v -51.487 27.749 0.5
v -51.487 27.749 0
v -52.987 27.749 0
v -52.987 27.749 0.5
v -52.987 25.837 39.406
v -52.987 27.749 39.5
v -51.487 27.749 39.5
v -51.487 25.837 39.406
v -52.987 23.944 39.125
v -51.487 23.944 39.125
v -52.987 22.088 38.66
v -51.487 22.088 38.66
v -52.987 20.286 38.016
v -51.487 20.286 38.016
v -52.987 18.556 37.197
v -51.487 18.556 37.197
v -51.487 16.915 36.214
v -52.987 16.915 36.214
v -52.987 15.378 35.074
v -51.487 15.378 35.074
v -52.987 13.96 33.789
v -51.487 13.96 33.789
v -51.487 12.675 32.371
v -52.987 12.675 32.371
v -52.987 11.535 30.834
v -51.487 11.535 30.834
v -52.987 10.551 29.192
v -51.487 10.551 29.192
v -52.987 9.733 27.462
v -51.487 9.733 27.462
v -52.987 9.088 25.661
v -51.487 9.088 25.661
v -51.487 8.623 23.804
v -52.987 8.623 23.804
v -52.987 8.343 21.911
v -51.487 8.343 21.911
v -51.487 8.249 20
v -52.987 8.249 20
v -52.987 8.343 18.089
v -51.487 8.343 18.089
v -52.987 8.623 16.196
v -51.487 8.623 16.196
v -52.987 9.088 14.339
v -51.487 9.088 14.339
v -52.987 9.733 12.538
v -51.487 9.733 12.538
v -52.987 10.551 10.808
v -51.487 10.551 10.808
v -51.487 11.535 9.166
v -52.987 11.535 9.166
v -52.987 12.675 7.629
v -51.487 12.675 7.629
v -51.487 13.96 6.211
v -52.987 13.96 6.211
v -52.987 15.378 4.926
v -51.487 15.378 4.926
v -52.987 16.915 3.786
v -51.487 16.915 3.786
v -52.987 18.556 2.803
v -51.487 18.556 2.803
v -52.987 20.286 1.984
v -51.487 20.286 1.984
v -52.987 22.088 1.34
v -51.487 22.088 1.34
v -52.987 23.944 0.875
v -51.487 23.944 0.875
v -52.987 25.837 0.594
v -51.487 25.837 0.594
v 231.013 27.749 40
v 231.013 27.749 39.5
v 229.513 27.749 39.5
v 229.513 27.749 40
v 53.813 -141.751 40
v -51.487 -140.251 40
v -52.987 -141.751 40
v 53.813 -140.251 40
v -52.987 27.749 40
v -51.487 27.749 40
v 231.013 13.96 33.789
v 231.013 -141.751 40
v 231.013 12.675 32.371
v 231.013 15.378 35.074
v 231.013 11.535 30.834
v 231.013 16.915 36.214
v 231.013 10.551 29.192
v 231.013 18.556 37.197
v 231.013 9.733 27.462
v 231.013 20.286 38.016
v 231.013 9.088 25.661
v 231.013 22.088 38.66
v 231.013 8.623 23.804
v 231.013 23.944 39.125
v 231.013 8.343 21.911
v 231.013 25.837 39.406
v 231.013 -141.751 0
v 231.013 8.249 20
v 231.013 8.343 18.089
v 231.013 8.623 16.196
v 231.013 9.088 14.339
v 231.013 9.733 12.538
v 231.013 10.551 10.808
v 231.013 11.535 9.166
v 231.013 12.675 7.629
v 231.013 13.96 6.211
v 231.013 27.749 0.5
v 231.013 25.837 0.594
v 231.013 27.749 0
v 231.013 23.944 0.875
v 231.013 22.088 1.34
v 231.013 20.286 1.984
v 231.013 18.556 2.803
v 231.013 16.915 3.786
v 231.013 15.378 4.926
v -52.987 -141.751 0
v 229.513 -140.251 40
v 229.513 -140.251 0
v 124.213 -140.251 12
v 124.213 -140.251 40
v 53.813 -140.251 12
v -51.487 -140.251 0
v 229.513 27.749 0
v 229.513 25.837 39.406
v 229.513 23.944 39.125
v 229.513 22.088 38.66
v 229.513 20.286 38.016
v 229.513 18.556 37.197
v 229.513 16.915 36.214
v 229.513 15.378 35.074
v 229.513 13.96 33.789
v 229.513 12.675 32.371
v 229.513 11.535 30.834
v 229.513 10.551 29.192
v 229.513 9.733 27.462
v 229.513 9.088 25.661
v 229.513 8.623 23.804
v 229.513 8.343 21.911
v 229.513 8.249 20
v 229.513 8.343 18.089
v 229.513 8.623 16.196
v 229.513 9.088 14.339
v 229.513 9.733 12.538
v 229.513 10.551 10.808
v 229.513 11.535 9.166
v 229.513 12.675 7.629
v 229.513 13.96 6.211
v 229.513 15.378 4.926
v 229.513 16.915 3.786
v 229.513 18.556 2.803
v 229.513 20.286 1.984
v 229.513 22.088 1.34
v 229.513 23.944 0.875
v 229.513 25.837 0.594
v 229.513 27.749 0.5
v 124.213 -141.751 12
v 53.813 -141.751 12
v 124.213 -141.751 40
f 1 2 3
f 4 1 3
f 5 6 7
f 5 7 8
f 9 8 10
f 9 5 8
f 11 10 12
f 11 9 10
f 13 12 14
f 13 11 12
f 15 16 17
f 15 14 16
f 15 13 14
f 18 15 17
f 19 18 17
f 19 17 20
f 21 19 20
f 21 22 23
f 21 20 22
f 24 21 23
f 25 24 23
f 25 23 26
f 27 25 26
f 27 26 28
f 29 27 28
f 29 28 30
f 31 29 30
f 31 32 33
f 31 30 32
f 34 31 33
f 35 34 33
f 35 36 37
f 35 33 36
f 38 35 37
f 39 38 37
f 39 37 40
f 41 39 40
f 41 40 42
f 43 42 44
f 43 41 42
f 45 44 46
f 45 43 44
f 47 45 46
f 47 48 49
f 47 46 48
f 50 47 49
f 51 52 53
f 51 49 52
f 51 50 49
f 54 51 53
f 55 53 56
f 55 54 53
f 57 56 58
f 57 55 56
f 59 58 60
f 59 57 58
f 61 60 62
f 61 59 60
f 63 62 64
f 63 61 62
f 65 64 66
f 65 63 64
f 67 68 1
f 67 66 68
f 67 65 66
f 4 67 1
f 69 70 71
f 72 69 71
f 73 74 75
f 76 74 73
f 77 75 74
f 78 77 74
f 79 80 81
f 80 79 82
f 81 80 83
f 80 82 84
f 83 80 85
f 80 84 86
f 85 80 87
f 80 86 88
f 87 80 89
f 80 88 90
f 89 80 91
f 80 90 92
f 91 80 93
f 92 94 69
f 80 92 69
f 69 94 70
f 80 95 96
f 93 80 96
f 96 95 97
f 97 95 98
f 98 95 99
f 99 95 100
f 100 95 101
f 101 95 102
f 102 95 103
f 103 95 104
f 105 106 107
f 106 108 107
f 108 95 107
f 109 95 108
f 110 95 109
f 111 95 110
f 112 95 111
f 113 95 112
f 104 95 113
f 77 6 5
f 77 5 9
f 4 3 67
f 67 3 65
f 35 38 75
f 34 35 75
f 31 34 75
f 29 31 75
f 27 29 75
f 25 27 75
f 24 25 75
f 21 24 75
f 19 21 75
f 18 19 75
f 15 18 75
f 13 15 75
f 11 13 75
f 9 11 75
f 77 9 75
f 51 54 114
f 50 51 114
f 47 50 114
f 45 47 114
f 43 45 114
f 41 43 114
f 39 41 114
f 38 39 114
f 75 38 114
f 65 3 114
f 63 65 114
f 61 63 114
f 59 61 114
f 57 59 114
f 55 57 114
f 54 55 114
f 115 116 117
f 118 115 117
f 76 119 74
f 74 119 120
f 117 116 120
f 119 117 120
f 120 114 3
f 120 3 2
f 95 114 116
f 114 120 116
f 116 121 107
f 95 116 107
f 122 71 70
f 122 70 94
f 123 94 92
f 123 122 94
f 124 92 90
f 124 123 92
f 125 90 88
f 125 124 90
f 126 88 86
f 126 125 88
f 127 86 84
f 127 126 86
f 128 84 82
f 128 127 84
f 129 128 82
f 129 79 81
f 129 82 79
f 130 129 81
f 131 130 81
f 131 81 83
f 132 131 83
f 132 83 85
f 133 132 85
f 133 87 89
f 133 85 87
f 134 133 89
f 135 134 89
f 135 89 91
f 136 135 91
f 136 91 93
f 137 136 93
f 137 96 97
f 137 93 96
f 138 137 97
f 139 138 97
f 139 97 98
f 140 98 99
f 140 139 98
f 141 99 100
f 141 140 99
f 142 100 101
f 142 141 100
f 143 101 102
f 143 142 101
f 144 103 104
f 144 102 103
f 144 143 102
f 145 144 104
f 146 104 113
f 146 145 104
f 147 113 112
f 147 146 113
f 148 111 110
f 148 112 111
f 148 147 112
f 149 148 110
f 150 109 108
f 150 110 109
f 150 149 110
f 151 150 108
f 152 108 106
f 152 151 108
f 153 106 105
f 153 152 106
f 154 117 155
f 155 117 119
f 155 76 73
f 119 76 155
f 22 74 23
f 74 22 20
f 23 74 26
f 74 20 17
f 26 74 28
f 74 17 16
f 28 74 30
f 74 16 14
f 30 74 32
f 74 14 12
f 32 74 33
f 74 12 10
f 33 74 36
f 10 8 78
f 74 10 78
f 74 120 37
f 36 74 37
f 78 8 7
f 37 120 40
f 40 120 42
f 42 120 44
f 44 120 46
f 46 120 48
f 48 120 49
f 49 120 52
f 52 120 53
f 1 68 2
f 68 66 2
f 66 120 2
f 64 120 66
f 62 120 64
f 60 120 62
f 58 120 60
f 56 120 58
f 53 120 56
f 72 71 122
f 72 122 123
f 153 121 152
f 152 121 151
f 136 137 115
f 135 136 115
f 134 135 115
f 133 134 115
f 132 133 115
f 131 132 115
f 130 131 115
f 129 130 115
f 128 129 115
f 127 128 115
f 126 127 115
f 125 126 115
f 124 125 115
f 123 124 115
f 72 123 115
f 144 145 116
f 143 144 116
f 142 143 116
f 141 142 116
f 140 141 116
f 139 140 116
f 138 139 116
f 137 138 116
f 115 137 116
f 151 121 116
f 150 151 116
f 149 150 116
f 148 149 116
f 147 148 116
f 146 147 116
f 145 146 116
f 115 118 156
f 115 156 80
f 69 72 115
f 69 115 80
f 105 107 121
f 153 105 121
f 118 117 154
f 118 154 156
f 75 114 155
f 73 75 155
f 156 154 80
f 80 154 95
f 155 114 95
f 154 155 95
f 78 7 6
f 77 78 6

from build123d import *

# Parameters (mm, degrees)
EXTRUDE_1_DEPTH          = 40
CUT_EXTRUDE_1_DEPTH      = 368
CUT_EXTRUDE_1_DEPTH_BACK = 39
SKETCH_2_R               = 19.5
CUT_EXTRUDE_2_DEPTH      = 39


with BuildPart() as part:
    # 草图1 → 凸台-拉伸1 (new body)
    with BuildSketch(Plane.XY):
        Polygon((-52.98729817, 27.74861141), (-52.98729817, -141.75138859), (231.01270183, -141.75138859), (231.01270183, 27.74861141), (229.51270183, 27.74861141), (229.51270183, -140.25138859), (-51.48729817, -140.25138859), (-51.48729817, 27.74861141), align=None)
    extrude(amount=EXTRUDE_1_DEPTH)

    # 草图2 → 切除-拉伸1 (cut, two sides: drawn at the far end of the back side and taken through both)
    with BuildSketch(Plane(origin=(-51.48729817, 0, 0), x_dir=(0, 0, -1), z_dir=(1, 0, 0)).offset(-CUT_EXTRUDE_1_DEPTH_BACK)):
        with Locations((-20, 27.74861141)):
            Circle(SKETCH_2_R)
    extrude(amount=CUT_EXTRUDE_1_DEPTH + CUT_EXTRUDE_1_DEPTH_BACK, mode=Mode.SUBTRACT)

    # 草图4 → 切除-拉伸2 (cut)
    with BuildSketch(Plane(origin=(0, -140.25138859, 0), x_dir=(1, 0, 0), z_dir=(0, 1, 0))):
        Polygon((89.01270183, -40), (53.81270183, -40), (53.81270183, -12), (89.01270183, -12), (124.21270183, -12), (124.21270183, -40), align=None)
    extrude(amount=-CUT_EXTRUDE_2_DEPTH, mode=Mode.SUBTRACT)


solid = part.part
